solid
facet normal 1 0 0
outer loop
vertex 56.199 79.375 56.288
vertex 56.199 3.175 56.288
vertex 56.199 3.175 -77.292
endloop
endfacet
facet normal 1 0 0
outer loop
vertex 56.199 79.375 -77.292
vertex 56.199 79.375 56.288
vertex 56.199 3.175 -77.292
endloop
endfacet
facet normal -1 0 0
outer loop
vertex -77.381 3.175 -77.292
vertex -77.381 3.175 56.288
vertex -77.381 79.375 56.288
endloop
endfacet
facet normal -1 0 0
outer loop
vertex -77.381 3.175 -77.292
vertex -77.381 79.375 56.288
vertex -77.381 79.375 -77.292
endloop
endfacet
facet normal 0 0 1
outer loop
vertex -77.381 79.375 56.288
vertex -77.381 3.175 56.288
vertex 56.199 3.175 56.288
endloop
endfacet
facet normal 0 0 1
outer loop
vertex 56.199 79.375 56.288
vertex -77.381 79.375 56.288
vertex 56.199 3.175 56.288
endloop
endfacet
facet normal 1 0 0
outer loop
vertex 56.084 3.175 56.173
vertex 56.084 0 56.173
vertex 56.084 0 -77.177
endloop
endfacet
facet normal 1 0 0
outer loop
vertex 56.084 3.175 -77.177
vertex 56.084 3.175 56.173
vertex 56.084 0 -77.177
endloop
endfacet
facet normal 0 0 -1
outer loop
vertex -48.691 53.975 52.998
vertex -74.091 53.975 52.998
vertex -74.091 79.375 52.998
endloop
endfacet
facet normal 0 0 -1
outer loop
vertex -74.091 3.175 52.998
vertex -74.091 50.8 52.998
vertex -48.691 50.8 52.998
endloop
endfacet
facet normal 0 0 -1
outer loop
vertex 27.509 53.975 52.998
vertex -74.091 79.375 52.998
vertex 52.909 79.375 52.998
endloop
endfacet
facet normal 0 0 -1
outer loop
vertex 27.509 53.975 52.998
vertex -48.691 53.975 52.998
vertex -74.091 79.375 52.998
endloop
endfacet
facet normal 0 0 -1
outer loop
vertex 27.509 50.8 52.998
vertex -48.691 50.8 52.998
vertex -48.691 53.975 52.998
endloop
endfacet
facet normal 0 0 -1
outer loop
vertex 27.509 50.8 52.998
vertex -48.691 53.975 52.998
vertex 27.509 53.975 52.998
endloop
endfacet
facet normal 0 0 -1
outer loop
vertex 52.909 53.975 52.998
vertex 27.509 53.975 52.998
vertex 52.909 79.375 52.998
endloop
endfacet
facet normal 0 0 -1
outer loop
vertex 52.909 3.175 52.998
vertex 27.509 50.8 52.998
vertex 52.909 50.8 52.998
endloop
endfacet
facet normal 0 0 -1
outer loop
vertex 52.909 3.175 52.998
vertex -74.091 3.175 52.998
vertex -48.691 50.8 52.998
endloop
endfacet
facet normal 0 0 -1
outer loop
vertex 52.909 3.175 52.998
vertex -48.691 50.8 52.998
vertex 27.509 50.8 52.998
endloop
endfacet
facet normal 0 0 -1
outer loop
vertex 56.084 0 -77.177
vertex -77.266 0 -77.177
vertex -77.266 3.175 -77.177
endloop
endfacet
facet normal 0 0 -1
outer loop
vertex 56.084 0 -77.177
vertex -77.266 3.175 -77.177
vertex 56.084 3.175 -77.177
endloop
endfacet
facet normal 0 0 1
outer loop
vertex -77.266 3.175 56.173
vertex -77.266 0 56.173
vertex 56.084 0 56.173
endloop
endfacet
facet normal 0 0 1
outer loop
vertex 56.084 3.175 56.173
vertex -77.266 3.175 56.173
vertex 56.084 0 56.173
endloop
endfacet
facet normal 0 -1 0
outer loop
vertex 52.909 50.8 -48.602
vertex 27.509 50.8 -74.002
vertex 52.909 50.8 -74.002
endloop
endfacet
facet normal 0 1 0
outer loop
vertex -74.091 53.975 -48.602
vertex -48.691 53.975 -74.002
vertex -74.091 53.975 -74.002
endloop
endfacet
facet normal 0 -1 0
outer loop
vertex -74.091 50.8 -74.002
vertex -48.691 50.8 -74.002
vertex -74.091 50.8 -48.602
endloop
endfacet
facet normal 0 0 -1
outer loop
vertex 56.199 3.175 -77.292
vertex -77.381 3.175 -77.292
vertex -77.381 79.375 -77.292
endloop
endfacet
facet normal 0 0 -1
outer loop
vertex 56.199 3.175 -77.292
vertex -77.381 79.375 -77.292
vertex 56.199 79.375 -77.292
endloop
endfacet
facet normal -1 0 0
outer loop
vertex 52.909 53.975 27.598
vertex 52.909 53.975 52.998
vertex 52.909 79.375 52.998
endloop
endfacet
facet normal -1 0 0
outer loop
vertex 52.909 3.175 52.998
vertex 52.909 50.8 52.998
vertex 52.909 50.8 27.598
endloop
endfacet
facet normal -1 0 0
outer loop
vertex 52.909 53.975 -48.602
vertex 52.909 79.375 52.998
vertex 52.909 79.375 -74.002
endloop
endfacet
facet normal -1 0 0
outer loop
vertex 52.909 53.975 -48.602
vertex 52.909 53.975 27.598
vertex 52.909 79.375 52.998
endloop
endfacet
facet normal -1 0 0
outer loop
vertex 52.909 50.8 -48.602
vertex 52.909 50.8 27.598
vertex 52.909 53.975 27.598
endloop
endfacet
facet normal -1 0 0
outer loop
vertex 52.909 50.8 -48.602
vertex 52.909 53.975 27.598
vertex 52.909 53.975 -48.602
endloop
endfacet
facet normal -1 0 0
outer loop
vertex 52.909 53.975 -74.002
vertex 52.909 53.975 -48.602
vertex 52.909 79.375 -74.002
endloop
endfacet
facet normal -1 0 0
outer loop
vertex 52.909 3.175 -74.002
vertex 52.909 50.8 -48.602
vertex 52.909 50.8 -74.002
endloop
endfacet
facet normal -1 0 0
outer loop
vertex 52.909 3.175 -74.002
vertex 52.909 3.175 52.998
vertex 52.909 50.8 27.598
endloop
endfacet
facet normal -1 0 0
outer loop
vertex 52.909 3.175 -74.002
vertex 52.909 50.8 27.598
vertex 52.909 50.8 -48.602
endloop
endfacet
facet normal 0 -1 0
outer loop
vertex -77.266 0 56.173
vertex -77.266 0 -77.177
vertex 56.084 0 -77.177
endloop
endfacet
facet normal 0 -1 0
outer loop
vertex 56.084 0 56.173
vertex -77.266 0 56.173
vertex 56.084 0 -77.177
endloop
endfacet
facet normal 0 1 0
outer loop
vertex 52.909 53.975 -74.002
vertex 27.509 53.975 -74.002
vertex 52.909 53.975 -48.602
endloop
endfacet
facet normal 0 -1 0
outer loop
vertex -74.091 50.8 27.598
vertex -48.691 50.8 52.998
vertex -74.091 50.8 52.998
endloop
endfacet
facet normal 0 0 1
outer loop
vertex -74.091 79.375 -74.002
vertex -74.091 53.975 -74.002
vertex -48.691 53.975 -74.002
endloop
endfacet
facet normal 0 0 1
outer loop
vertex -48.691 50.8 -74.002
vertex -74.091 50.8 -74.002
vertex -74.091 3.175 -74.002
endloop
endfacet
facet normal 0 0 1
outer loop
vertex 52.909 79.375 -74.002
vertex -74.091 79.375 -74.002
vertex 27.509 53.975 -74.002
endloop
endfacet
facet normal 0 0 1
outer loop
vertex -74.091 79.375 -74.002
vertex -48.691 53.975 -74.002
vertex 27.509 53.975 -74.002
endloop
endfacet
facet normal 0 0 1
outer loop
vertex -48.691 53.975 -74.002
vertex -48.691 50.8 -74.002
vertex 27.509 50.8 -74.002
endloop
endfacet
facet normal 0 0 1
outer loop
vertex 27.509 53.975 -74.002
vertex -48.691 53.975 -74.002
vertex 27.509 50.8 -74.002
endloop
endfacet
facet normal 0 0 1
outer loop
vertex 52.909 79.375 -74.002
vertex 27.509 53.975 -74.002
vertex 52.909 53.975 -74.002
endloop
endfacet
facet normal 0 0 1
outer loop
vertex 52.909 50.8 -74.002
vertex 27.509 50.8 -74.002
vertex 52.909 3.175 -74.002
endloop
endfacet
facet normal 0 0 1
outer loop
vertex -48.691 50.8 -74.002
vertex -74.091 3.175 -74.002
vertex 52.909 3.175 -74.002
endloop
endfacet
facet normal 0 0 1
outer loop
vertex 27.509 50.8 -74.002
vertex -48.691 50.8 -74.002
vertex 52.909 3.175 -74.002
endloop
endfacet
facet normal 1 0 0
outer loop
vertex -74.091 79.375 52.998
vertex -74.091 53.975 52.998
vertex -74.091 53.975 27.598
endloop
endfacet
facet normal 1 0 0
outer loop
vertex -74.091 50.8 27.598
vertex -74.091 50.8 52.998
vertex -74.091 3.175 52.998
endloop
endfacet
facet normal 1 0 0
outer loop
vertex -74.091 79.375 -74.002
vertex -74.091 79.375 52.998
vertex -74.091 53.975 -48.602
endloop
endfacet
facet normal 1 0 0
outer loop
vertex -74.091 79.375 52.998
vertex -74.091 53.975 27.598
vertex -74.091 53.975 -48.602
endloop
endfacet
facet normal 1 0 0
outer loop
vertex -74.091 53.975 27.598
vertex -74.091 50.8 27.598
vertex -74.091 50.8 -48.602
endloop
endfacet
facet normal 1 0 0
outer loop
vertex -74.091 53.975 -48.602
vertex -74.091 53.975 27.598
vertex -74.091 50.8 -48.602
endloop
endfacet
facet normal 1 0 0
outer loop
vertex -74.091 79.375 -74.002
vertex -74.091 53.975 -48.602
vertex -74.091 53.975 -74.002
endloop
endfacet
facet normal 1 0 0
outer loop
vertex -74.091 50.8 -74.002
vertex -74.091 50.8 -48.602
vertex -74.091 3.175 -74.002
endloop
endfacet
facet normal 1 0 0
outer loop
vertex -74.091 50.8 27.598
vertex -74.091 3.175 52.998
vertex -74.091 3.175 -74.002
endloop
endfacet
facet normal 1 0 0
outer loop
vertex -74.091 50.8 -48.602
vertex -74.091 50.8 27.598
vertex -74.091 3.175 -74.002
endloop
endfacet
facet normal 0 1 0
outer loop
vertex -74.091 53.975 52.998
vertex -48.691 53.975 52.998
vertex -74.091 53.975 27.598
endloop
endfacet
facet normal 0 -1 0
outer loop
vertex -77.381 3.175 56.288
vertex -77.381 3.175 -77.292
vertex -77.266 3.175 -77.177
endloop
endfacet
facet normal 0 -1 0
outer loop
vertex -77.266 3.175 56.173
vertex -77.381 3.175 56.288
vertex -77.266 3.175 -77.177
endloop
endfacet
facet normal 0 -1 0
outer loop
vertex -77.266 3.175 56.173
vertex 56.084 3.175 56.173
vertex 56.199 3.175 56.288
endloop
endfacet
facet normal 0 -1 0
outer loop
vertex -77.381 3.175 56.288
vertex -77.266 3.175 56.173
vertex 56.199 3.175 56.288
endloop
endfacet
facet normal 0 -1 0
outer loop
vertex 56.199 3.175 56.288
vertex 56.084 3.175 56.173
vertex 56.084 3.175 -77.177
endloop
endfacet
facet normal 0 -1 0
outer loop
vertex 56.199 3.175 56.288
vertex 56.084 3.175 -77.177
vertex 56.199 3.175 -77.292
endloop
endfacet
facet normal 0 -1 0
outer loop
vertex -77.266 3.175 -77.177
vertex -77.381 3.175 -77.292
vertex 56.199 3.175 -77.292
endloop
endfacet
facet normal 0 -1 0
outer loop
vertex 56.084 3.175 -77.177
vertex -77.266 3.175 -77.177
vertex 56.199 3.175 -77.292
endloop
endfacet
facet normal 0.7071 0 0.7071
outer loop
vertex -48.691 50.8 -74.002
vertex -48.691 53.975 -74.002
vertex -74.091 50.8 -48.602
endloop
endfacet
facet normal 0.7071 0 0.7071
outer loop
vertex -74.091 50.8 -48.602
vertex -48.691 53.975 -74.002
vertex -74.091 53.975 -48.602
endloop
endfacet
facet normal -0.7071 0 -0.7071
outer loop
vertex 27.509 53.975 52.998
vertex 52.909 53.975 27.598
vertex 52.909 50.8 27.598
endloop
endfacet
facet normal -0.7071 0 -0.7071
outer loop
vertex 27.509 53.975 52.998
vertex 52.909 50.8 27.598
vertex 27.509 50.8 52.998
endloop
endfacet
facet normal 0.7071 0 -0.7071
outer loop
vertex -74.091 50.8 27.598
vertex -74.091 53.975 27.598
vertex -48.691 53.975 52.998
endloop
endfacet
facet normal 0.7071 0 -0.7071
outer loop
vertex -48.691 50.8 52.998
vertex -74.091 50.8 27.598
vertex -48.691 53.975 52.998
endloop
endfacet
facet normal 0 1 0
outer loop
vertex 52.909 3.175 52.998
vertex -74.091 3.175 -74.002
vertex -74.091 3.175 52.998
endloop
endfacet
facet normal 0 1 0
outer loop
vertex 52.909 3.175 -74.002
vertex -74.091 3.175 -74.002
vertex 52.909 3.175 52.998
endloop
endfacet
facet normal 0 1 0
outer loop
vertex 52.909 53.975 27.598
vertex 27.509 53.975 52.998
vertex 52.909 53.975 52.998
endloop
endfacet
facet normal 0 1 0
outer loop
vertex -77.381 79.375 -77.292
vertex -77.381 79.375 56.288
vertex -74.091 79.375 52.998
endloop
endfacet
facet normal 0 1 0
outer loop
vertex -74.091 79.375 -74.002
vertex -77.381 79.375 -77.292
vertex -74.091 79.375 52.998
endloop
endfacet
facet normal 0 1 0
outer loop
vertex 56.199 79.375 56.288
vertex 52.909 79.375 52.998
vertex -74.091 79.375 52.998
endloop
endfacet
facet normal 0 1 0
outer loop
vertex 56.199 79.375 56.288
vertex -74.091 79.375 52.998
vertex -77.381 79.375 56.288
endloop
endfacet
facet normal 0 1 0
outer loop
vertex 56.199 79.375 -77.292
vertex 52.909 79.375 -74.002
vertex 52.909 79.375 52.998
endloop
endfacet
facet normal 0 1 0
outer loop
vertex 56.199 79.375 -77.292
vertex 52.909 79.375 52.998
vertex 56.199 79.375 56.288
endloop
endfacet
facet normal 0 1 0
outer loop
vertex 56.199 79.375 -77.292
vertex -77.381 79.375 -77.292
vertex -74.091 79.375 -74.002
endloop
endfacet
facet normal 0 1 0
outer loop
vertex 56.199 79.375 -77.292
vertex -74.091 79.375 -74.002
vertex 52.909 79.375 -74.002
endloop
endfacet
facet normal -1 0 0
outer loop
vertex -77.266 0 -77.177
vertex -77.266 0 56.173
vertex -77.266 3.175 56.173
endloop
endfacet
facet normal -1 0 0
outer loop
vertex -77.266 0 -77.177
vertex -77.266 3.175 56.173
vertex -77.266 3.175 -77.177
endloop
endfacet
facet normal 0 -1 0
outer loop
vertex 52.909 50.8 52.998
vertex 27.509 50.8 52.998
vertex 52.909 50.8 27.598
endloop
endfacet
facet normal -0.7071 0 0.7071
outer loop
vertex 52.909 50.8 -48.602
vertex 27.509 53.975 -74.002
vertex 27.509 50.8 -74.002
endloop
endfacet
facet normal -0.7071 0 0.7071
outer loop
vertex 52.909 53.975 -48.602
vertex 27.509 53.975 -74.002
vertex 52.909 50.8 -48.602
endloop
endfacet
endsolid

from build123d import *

# Parameters (mm, degrees)
SKETCH1_W           = 133.35
SKETCH1_H           = 133.35
BOSS_EXTRUDE2_DEPTH = 3.175
SKETCH2_W           = 133.579746761
SKETCH2_H           = 133.57974676
SKETCH2_W_2         = 127
SKETCH2_H_2         = 127
EXTRUDE_THIN1_DEPTH = 76.2
BOSS_EXTRUDE3_START = -25.4
BOSS_EXTRUDE3_DEPTH = 3.175


with BuildPart() as part:
    # Sketch1 → Boss-Extrude2 (new body)
    with BuildSketch(Plane(origin=(0, 0, 0), x_dir=(1, 0, 0), z_dir=(0, 1, 0))):
        with Locations((-10.590734266, 10.501923077)):
            Rectangle(SKETCH1_W, SKETCH1_H)
    extrude(amount=BOSS_EXTRUDE2_DEPTH)

    # Sketch2 → Extrude-Thin1 (add)
    with BuildSketch(Plane(origin=(0, 3.175, 0), x_dir=(1, 0, 0), z_dir=(0, 1, 0))):
        with Locations((-10.590734266, 10.501923077)):
            Rectangle(SKETCH2_W, SKETCH2_H)
        with Locations((-10.590734266, 10.501923077)):
            Rectangle(SKETCH2_W_2, SKETCH2_H_2, mode=Mode.SUBTRACT)
    extrude(amount=EXTRUDE_THIN1_DEPTH)

    # Sketch4 → Boss-Extrude3 (add)
    with BuildSketch(Plane(origin=(0, 79.375, 0), x_dir=(1, 0, 0), z_dir=(0, 1, 0)).offset(BOSS_EXTRUDE3_START)):
        Polygon((-48.690734266, 74.001923077), (-74.090734266, 48.601923077), (-74.090734266, 74.001923077), align=None)
        Polygon((-74.090734266, -52.998076923), (-74.090734266, -27.598076923), (-48.690734266, -52.998076923), align=None)
        Polygon((52.909265734, 74.001923077), (27.509265734, 74.001923077), (52.909265734, 48.601923077), align=None)
        Polygon((52.909265734, -52.998076923), (52.909265734, -27.598076923), (27.509265734, -52.998076923), align=None)
    extrude(amount=-BOSS_EXTRUDE3_DEPTH)


solid = part.part
